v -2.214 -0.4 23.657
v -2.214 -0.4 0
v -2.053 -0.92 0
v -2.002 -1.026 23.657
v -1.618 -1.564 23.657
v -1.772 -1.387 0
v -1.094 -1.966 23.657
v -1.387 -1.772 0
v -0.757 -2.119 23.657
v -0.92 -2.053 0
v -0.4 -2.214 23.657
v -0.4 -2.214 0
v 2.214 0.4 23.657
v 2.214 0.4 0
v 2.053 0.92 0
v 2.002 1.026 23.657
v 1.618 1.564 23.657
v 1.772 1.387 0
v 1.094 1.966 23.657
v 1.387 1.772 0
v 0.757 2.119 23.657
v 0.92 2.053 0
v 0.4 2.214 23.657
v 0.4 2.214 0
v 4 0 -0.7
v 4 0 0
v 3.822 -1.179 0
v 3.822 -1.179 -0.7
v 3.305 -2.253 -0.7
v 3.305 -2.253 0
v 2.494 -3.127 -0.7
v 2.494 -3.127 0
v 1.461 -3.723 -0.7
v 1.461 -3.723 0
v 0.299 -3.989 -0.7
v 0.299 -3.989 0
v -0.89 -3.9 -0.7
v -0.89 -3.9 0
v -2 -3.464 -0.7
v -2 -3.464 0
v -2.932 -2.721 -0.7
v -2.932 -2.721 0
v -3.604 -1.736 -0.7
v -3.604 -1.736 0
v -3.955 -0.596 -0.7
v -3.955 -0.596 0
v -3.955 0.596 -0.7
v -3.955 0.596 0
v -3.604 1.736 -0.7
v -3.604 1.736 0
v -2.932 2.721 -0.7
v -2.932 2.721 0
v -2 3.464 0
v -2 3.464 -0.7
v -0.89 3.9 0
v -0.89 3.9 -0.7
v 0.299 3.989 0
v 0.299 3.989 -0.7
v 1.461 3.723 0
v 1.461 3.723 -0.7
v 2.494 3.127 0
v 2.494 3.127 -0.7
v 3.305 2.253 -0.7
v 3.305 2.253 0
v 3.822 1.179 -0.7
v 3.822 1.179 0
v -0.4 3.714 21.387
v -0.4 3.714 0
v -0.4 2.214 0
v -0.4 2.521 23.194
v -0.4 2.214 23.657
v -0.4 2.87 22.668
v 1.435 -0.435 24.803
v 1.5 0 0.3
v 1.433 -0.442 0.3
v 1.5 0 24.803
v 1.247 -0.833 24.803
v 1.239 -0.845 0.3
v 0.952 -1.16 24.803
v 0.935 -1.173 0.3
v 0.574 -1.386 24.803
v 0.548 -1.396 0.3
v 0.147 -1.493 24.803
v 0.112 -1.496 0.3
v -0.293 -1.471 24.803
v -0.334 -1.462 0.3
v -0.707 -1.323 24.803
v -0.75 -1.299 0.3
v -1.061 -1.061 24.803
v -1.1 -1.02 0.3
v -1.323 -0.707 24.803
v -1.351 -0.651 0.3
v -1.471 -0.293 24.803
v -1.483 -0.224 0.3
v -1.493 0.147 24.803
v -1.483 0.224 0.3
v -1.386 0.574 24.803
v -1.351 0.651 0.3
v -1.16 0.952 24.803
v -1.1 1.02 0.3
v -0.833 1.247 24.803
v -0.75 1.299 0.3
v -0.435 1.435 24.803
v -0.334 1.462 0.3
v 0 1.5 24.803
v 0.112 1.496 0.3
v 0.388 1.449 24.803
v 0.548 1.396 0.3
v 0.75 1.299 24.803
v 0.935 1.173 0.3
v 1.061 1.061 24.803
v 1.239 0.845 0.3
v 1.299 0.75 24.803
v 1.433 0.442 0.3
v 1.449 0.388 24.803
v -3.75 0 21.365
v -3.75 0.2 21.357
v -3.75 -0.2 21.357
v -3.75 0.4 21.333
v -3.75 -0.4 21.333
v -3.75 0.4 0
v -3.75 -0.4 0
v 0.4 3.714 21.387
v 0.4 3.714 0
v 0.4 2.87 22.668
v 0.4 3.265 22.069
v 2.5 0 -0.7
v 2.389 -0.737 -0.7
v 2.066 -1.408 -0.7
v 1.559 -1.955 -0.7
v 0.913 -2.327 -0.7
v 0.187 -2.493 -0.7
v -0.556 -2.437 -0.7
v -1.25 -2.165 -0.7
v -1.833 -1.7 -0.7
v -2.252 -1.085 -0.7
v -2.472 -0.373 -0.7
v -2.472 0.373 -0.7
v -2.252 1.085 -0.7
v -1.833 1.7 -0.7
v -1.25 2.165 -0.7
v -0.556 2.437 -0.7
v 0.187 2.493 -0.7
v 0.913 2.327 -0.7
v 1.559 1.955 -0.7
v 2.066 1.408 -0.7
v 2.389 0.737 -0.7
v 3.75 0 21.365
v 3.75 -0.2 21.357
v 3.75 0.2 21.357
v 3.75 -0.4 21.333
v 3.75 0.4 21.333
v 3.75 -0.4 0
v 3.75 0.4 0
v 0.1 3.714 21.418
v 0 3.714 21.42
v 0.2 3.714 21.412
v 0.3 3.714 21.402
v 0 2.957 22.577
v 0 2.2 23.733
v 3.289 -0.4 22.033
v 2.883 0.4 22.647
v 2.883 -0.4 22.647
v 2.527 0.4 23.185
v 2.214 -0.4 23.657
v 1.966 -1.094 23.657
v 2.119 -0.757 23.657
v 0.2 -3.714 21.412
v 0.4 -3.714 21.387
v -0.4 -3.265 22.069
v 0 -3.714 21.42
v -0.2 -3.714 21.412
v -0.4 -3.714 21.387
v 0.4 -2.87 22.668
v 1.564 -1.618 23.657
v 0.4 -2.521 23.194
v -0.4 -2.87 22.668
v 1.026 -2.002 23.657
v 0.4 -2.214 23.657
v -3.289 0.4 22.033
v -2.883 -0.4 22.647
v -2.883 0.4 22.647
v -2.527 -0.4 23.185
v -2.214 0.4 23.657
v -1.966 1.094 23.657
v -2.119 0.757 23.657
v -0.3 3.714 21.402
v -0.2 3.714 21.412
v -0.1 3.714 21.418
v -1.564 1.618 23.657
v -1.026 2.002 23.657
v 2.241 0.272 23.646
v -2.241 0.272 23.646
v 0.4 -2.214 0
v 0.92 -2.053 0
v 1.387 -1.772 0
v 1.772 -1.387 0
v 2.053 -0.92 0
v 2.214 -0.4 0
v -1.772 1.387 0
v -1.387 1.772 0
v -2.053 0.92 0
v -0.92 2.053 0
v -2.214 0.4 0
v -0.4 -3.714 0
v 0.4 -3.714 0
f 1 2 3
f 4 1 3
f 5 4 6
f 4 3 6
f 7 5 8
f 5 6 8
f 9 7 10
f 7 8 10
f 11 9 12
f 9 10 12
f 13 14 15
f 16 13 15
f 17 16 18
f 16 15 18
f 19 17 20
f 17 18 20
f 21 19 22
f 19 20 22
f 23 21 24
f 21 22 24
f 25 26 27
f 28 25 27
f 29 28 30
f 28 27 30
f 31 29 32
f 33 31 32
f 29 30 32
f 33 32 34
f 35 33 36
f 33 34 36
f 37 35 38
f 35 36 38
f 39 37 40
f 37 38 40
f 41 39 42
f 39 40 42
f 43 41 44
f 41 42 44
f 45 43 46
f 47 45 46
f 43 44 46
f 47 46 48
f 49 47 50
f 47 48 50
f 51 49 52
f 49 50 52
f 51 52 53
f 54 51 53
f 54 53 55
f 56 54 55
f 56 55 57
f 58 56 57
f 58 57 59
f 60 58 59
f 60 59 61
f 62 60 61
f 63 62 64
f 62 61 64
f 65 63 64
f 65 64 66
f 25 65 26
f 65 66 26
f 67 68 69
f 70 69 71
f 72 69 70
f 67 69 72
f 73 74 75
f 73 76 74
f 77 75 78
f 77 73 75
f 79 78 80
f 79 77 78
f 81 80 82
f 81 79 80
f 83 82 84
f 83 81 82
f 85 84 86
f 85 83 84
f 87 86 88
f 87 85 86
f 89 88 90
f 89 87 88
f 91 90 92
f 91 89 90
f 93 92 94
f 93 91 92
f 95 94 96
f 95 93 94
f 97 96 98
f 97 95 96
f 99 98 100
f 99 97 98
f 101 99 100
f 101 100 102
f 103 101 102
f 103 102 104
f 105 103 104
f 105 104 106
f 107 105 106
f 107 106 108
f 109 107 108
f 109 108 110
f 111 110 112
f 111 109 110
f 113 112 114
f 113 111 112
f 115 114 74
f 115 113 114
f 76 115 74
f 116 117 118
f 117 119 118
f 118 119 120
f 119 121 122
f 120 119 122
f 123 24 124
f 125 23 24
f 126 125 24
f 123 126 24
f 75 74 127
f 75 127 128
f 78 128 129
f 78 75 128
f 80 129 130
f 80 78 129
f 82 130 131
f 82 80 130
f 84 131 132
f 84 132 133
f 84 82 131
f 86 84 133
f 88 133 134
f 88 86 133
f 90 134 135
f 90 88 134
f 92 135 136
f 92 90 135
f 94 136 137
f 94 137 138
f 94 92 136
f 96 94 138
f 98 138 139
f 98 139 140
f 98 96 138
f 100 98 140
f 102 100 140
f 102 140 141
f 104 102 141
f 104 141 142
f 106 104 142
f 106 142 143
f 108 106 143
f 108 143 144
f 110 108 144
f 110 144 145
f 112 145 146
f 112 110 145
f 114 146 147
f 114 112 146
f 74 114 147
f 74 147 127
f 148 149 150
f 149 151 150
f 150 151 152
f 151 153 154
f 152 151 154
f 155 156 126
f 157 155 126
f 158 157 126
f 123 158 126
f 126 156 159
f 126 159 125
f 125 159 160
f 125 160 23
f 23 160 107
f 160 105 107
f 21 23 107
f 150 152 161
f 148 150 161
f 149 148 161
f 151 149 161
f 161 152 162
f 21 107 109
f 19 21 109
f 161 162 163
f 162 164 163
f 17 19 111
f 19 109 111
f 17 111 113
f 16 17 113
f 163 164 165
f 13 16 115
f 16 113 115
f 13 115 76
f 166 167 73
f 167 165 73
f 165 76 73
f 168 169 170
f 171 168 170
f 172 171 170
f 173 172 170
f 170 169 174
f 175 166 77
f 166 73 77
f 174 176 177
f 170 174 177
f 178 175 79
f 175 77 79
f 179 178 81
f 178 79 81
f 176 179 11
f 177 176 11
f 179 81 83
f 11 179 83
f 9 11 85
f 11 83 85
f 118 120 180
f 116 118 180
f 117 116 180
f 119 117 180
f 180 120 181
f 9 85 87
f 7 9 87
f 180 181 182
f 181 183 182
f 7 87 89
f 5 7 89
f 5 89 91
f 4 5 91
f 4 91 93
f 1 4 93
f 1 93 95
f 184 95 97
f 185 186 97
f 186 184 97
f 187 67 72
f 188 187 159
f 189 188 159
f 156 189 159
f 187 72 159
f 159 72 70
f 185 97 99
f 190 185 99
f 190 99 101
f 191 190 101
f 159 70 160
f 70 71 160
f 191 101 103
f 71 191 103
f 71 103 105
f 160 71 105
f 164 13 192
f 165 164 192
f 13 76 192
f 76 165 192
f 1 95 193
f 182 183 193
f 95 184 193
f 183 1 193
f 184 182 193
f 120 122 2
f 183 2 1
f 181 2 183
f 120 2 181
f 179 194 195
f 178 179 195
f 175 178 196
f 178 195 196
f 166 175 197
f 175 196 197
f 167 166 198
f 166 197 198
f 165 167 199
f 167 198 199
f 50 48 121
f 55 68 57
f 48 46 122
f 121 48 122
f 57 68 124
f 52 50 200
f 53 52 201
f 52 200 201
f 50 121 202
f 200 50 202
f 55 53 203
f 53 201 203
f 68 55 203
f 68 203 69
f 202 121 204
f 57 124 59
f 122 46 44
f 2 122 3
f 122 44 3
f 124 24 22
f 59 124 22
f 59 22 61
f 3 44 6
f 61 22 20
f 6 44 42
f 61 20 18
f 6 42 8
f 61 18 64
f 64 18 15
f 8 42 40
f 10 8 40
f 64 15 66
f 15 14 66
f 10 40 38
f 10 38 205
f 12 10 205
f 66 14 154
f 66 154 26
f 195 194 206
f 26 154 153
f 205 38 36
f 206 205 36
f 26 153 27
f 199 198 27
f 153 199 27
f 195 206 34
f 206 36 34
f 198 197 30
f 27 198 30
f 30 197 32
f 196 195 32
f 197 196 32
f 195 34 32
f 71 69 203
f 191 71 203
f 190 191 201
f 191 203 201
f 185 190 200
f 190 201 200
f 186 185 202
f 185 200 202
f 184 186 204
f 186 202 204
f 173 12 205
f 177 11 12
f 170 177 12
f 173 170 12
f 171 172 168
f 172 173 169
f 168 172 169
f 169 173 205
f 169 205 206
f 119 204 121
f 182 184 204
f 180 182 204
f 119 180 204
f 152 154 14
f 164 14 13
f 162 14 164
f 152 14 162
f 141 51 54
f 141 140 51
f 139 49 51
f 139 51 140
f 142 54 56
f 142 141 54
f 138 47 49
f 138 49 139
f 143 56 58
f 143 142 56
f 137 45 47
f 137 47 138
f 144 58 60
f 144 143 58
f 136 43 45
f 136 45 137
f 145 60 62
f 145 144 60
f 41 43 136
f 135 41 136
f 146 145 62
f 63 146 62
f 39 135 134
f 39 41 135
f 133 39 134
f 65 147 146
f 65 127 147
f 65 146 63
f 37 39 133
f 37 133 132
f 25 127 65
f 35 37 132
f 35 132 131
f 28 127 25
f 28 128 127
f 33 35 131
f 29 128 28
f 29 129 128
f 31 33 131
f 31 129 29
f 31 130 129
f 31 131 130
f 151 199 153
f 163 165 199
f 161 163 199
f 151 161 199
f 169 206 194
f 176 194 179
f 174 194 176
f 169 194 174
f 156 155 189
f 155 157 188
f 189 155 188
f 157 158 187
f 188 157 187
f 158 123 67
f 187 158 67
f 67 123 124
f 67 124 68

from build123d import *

# Parameters (mm, degrees)
F0_R     = 1.5
F1_DEPTH = 25
F2_R     = 4
F2_R_2   = 1.5
F3_DEPTH = 0.7
F4_SIZE  = 1


with BuildPart() as f1:
    # F0 (on Top) → F1 (new body)
    with BuildSketch(Plane.XY):
        with BuildLine():
            Line((3.75, 0.4), (2.214159, 0.4))
            ThreePointArc((2.214159, 0.4), (1.59099, 1.59099), (0.4, 2.214159))
            Line((0.4, 2.214159), (0.4, 3.714159))
            Line((0.4, 3.714159), (-0.4, 3.714159))
            Line((-0.4, 3.714159), (-0.4, 2.214159))
            ThreePointArc((-0.4, 2.214159), (-1.59099, 1.59099), (-2.214159, 0.4))
            Line((-2.214159, 0.4), (-3.75, 0.4))
            Line((-3.75, 0.4), (-3.75, -0.4))
            Line((-3.75, -0.4), (-2.214159, -0.4))
            ThreePointArc((-2.214159, -0.4), (-1.59099, -1.59099), (-0.4, -2.214159))
            Line((-0.4, -2.214159), (-0.4, -3.714159))
            Line((-0.4, -3.714159), (0.4, -3.714159))
            Line((0.4, -3.714159), (0.4, -2.214159))
            ThreePointArc((0.4, -2.214159), (1.59099, -1.59099), (2.214159, -0.4))
            Line((2.214159, -0.4), (3.75, -0.4))
            Line((3.75, -0.4), (3.75, 0.4))
        make_face()
        Circle(F0_R, mode=Mode.SUBTRACT)
    extrude(amount=F1_DEPTH)

    # F2 (on face) → F3 (join)
    with BuildSketch(Plane(origin=(0, 0, 0), x_dir=(1, 0, 0), z_dir=(0, 0, -1))):
        Circle(F2_R)
        Circle(F2_R_2, mode=Mode.SUBTRACT)
    extrude(amount=F3_DEPTH)

    # F4
    f4_edges = [f1.edges().sort_by_distance(p)[0] for p in [
        (-1.5, 0, -0.7),
    ]]
    chamfer(f4_edges, length=F4_SIZE)

    # F5 (on Right) → F6 (revolve, intersect)
    with BuildSketch(Plane.YZ):
        Polygon((4.396838, 20.37701), (0, 27.094347), (0, -1.847252), (4.396838, -1.802312), align=None)
    revolve(axis=Axis((0, 0, 12.623548), (0, 0, -1)), mode=Mode.INTERSECT)


solid = f1.part
